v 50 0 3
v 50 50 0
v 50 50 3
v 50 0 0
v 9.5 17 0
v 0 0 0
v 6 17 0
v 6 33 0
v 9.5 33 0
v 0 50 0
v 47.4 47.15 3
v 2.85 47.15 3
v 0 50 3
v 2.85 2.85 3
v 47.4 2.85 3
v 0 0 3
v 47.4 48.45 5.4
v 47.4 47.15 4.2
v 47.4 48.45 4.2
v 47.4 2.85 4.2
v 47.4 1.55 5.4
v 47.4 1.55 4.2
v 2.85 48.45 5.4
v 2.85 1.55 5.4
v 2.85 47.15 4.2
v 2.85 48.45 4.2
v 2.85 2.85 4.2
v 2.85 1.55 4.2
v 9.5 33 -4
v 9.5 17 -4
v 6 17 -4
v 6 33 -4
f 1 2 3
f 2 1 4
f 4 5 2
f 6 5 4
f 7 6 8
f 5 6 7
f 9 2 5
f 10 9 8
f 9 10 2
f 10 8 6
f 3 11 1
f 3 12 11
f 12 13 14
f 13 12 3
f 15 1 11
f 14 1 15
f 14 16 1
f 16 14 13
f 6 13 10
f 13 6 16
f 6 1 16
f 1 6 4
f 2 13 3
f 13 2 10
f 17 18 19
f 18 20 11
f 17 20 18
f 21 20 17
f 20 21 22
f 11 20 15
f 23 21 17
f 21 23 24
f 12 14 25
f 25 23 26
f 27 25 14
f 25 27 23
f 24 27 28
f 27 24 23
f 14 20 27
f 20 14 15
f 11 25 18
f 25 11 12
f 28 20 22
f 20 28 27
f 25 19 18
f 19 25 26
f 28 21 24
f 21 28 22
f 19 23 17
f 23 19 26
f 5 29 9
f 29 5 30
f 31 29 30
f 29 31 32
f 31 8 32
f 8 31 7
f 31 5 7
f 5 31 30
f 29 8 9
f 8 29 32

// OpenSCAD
$fn = 60;

panjang_x = 50.0; lebar_y = 50.0; tebal_tutup = 3.0;
tebal_dinding = 2.6; toleransi = 0.25;

lebar_leher_tutup = lebar_y - (2 * tebal_dinding) - (2 * toleransi);
lebar_lidah_tutup = lebar_leher_tutup + (2 * 1.3);
panjang_tutup = panjang_x - tebal_dinding - toleransi;

// Posisi sudah dibalik (sisi atas menempel di Z = 0) agar minim support saat print!
translate([0, lebar_y, tebal_tutup])
rotate([180, 0, 0])
union() {
    cube([panjang_x, lebar_y, tebal_tutup]);
    translate([tebal_dinding + toleransi, (lebar_y - lebar_leher_tutup) / 2, -2.4])
        cube([panjang_tutup - tebal_dinding, lebar_leher_tutup, 2.4]);
    translate([tebal_dinding + toleransi, (lebar_y - lebar_lidah_tutup) / 2, -2.4])
        cube([panjang_tutup - tebal_dinding, lebar_lidah_tutup, 1.2]);
    translate([6, (lebar_y - 16) / 2, tebal_tutup])
        cube([3.5, 16, 4.0]);
}
